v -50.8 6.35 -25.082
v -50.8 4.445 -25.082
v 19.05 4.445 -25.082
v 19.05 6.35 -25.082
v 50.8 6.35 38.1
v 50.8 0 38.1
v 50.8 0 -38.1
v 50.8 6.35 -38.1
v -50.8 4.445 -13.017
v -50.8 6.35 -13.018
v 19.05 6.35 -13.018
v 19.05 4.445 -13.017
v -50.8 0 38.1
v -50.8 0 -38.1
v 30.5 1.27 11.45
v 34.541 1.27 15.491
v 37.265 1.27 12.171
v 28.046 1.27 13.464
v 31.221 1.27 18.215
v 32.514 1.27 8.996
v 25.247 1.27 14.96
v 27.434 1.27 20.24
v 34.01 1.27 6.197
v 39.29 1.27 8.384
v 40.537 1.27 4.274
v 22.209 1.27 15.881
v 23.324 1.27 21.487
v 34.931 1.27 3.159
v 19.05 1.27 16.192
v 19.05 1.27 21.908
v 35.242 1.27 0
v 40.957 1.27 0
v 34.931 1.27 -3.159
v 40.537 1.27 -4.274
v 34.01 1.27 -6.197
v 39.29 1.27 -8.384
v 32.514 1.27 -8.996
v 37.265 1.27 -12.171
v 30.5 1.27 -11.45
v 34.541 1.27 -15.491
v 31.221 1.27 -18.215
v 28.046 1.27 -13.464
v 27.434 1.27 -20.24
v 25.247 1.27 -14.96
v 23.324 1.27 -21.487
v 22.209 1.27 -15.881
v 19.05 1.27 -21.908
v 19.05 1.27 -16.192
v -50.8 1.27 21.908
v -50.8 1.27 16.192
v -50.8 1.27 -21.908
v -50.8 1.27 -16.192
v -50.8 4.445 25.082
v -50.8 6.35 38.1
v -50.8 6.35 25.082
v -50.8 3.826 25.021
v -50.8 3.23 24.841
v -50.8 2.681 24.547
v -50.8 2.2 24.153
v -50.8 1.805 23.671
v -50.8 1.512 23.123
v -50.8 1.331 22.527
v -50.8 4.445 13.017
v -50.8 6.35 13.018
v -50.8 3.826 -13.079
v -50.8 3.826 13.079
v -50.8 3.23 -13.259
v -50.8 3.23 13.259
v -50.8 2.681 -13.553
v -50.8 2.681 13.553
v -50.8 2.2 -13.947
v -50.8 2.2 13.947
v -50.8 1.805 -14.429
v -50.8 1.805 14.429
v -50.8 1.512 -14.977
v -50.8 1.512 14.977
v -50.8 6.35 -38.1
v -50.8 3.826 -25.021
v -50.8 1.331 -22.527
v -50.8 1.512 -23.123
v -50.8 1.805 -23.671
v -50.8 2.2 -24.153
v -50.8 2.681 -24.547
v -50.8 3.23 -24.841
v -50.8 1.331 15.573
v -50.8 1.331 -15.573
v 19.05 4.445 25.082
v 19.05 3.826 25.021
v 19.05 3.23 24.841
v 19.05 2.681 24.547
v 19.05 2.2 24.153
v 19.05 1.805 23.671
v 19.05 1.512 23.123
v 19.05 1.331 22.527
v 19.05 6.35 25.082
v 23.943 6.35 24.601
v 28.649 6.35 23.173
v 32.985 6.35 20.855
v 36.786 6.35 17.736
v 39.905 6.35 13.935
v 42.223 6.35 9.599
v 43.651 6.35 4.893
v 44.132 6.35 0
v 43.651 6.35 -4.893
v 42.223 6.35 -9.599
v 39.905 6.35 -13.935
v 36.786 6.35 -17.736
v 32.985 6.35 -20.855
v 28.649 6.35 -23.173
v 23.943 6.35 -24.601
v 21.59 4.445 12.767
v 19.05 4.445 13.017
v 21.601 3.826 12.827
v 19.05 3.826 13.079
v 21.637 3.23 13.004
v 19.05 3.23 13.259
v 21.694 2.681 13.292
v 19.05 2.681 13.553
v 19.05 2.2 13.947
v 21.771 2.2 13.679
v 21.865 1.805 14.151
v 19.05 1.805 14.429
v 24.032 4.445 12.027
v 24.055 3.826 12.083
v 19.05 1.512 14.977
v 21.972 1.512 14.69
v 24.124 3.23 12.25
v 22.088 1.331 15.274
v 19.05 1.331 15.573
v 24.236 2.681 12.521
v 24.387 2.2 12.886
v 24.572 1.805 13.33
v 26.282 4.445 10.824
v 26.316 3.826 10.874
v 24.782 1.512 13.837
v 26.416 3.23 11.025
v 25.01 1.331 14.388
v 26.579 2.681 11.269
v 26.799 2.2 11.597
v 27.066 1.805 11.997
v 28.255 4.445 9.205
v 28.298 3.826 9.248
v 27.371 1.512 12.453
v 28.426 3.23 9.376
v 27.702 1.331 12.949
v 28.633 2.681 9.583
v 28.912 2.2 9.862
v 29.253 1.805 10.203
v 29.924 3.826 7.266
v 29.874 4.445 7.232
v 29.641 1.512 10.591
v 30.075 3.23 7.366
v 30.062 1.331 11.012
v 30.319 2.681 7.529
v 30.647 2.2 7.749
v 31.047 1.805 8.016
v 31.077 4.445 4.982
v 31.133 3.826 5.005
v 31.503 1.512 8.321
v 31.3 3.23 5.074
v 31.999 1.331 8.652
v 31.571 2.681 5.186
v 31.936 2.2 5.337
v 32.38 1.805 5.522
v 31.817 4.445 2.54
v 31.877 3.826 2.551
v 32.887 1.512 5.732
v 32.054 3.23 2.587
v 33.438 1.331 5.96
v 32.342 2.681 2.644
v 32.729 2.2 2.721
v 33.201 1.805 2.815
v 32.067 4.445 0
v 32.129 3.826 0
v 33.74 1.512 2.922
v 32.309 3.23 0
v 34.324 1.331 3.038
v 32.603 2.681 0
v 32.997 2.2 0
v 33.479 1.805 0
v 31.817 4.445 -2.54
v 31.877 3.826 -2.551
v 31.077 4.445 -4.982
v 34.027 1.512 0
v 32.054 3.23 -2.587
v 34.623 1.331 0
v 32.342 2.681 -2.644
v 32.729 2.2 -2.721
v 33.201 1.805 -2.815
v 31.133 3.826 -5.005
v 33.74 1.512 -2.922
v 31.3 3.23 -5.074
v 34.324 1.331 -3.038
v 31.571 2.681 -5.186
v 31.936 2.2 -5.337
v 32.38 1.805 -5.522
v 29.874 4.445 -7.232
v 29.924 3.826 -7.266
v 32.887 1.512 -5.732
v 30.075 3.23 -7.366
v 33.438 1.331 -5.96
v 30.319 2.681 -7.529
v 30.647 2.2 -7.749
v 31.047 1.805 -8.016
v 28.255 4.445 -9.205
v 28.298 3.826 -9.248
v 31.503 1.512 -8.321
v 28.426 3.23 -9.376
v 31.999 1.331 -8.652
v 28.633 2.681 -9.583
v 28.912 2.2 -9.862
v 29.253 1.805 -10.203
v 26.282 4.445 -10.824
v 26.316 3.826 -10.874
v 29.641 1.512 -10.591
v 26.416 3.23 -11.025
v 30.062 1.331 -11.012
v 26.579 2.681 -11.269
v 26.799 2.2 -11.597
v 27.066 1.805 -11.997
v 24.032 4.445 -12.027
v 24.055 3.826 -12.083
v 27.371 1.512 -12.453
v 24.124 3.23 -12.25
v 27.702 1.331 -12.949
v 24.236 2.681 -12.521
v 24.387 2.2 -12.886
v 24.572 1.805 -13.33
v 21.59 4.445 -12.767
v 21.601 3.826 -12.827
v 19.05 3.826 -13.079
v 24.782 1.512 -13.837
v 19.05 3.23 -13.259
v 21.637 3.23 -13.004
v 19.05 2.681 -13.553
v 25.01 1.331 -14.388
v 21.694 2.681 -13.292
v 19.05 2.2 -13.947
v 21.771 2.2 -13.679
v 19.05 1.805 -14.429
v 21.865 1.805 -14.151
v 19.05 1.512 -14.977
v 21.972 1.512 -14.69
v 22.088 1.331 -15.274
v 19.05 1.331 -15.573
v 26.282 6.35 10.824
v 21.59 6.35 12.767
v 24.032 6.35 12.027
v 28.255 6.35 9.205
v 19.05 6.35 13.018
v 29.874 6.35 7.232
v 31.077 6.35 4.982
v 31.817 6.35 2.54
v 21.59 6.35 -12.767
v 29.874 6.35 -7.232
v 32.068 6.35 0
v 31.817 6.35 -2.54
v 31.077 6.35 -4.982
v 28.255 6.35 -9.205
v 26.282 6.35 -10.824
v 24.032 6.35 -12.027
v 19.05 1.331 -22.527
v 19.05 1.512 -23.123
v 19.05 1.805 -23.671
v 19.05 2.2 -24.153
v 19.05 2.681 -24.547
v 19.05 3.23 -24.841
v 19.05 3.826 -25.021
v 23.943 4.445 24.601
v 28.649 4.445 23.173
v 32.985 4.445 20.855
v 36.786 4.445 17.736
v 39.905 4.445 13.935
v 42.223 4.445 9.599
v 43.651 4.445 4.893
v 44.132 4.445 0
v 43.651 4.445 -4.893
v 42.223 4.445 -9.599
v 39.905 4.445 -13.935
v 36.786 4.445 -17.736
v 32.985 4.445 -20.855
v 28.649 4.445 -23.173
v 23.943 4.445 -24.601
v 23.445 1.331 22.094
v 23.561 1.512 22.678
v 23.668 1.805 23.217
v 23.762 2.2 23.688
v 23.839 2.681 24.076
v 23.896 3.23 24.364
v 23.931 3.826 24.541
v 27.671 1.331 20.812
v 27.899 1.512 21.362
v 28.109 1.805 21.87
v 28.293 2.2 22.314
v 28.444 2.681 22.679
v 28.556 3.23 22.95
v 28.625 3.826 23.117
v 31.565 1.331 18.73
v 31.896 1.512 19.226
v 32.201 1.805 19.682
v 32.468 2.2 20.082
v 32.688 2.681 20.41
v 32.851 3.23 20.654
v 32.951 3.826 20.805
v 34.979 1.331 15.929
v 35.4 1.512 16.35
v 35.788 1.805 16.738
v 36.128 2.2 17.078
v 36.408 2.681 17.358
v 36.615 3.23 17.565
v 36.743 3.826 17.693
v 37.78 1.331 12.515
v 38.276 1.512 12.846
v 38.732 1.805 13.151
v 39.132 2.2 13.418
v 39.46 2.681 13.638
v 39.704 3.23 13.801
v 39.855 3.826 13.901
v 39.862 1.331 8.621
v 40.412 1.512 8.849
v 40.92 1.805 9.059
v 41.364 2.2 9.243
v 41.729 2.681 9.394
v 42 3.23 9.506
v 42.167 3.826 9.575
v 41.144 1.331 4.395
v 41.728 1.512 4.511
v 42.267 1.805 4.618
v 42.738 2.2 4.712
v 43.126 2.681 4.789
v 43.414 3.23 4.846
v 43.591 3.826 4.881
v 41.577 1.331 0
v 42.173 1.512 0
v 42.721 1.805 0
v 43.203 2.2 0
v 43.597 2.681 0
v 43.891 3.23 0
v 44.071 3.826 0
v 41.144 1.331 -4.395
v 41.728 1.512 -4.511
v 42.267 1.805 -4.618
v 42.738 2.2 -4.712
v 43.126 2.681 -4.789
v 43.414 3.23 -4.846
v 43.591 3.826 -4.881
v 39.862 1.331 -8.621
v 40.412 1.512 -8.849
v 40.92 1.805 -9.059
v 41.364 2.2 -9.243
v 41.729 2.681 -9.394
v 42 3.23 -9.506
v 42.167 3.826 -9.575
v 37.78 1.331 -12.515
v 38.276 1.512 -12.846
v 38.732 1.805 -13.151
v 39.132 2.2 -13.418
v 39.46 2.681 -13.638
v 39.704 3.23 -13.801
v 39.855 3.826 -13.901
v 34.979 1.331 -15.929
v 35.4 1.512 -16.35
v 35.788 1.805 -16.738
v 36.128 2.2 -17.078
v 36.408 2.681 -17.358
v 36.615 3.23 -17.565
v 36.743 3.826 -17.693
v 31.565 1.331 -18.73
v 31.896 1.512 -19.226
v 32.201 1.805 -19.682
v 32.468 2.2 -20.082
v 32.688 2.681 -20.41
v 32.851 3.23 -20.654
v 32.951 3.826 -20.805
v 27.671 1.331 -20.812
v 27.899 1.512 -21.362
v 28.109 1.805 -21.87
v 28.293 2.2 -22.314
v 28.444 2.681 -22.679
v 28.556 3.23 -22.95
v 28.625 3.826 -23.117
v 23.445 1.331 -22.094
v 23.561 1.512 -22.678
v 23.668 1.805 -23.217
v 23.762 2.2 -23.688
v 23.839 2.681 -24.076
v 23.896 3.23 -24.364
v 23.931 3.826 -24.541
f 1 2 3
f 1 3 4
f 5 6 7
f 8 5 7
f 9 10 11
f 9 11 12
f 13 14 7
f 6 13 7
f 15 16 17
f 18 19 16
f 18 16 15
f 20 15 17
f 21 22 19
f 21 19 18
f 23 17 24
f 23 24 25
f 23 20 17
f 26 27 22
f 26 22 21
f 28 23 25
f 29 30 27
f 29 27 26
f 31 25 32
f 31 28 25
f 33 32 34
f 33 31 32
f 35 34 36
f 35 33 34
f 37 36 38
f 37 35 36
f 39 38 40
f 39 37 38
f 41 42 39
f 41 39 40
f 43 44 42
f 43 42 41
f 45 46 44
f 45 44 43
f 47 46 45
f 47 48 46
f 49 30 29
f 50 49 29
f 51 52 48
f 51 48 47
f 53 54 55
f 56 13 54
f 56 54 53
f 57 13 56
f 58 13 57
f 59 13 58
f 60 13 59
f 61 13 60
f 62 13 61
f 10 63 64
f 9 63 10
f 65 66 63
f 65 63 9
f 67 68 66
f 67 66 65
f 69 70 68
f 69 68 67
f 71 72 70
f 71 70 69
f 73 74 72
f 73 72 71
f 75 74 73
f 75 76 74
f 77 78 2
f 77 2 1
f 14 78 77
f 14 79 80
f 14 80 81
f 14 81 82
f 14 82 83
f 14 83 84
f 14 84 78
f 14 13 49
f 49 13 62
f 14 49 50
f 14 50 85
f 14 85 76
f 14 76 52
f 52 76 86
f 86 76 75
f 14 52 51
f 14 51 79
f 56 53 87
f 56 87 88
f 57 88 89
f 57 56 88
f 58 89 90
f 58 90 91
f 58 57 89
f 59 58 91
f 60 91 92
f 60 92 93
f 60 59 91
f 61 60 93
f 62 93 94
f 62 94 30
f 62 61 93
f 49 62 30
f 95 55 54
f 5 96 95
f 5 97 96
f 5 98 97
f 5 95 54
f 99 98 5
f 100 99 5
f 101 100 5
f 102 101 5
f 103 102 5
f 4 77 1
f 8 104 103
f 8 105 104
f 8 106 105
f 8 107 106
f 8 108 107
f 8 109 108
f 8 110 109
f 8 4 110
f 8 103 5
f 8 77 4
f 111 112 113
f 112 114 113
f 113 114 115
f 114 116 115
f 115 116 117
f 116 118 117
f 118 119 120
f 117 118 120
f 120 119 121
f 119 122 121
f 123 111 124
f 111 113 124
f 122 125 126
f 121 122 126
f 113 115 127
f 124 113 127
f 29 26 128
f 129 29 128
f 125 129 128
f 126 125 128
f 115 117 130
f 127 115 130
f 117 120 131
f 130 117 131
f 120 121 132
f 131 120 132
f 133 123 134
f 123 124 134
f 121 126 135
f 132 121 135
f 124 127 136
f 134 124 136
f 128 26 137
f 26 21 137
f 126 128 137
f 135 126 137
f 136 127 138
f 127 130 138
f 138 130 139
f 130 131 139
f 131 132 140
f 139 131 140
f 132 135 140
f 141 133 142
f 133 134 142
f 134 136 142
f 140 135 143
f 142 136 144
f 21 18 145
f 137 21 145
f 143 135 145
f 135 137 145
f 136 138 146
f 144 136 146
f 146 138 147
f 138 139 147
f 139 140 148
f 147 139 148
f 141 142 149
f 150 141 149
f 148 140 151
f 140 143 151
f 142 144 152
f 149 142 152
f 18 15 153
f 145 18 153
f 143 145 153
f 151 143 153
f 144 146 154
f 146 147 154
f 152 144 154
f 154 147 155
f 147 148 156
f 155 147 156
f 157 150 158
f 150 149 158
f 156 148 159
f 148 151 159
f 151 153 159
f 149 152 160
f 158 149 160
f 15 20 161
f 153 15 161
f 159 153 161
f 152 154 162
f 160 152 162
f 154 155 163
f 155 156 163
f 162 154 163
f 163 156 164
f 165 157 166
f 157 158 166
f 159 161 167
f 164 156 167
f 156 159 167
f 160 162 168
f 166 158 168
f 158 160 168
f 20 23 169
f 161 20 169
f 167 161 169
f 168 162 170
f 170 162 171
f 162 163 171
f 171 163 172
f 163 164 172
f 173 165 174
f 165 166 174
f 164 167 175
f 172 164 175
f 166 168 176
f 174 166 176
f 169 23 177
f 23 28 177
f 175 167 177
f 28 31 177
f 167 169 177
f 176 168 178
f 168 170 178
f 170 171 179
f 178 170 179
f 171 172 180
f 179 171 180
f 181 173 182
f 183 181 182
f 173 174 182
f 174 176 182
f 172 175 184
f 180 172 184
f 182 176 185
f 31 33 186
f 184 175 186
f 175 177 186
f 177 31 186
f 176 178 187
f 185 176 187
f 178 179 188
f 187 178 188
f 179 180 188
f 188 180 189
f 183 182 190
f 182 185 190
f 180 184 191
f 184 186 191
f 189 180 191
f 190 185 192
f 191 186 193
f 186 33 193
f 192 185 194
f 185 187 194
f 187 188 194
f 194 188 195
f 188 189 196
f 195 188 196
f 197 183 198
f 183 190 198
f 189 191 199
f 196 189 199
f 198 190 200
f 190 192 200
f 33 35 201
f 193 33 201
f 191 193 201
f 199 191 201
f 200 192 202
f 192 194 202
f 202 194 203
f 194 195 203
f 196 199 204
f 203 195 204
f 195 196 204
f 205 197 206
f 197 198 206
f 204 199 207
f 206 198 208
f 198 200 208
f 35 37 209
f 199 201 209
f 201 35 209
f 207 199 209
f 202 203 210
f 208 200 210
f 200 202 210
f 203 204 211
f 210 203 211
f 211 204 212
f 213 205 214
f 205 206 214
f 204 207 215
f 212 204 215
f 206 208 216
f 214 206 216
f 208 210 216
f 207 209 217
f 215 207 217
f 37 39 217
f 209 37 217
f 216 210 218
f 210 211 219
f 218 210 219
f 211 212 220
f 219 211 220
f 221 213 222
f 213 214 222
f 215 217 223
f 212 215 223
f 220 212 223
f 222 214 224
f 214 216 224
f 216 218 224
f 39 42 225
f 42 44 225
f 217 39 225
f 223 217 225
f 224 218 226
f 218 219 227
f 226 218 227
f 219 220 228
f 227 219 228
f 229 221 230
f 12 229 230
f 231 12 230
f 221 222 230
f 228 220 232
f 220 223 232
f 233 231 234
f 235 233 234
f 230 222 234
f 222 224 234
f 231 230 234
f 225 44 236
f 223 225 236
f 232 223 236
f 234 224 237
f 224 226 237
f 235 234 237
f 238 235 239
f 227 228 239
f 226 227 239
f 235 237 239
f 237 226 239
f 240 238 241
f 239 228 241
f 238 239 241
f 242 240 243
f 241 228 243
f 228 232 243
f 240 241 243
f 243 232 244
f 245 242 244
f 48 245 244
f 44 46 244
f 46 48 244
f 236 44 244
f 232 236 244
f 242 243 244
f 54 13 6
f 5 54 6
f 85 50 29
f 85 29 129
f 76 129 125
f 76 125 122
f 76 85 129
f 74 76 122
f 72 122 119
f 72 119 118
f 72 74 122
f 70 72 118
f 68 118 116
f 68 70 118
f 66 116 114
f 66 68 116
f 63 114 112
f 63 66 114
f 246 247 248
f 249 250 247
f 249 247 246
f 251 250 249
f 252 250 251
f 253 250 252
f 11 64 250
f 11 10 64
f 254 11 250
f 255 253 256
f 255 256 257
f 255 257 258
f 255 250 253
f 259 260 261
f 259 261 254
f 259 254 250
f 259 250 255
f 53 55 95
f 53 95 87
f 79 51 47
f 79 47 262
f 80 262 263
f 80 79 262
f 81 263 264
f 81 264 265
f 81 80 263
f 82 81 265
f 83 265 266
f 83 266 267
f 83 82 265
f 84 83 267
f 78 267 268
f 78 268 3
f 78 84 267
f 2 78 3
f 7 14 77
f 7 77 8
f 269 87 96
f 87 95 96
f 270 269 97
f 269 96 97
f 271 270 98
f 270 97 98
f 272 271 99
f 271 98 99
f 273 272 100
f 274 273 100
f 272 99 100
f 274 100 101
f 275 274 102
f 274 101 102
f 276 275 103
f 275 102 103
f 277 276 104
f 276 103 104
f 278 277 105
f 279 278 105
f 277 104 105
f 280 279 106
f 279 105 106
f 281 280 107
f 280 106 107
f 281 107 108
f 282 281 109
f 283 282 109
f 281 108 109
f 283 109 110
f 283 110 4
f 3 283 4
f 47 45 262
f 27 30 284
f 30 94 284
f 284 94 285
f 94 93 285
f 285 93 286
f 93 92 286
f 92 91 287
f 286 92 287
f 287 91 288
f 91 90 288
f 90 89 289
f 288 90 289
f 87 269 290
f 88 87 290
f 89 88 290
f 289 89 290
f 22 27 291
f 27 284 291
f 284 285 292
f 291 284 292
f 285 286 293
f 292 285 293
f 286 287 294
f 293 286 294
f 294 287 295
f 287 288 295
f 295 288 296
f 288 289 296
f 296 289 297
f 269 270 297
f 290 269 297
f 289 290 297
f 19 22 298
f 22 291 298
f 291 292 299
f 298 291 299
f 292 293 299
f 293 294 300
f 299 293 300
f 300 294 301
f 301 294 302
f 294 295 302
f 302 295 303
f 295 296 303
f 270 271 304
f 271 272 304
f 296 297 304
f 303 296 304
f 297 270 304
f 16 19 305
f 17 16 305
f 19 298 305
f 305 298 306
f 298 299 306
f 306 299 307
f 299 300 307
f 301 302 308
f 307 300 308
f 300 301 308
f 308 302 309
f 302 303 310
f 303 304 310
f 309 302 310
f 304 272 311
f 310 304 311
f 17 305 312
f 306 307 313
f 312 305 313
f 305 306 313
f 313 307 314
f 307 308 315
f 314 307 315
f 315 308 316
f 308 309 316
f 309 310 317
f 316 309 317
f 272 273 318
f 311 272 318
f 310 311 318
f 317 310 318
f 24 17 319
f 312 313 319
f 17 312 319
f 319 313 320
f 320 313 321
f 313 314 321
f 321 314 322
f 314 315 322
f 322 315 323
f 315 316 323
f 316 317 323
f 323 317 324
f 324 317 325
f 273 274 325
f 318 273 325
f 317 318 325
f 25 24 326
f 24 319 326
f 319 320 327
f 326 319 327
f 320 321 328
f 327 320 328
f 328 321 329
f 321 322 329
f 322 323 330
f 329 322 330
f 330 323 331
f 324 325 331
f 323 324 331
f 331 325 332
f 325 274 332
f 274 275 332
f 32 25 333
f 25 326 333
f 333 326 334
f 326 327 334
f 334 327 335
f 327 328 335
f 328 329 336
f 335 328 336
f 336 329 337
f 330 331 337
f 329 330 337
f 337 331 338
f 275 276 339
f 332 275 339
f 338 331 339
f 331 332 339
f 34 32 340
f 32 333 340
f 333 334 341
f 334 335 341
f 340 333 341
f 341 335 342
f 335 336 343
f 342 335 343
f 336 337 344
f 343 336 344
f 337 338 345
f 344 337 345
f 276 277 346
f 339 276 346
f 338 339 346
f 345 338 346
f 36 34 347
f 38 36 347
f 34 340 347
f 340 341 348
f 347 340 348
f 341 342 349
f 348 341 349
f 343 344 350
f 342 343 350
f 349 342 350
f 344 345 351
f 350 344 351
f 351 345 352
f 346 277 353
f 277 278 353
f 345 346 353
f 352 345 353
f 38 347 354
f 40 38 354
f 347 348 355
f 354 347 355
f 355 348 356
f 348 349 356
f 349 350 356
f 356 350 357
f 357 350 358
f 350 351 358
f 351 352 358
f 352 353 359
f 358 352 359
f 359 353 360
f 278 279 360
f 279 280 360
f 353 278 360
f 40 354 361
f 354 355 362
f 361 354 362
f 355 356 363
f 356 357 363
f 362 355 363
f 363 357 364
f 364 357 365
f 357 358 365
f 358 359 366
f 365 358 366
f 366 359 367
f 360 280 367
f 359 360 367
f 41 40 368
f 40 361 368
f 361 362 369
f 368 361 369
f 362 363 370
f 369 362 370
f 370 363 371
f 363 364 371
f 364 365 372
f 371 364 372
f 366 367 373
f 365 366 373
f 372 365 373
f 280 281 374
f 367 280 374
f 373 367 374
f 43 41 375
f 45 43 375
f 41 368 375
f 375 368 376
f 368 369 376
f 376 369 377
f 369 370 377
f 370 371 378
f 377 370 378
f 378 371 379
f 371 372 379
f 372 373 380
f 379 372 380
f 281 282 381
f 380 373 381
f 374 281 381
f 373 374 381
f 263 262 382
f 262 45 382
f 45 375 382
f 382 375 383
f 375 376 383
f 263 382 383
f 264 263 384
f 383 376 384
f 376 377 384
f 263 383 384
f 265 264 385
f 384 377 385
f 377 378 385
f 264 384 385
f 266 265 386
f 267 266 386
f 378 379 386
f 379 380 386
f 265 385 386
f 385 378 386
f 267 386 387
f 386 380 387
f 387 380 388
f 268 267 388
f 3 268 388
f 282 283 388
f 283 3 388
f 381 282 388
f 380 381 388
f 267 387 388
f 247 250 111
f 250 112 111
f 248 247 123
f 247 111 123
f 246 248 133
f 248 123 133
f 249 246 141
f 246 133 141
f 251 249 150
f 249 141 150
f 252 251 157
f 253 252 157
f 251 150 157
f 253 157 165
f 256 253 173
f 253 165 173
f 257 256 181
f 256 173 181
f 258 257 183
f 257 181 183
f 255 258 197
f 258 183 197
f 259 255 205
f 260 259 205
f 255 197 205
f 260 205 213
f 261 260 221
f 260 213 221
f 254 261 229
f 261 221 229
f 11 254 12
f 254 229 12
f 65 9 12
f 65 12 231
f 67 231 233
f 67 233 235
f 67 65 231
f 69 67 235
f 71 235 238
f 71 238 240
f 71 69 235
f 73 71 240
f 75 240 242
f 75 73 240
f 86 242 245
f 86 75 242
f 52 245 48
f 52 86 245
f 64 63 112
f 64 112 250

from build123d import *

# Parameters (mm, degrees)
SKETCH1_W            = 101.6
SKETCH1_H            = 76.2
BASE_PLATE_DEPTH     = 6.35
PIPE_START           = -50.8
PIPE_PROFILE_DEPTH   = 69.85
PIPE_PROFILE_2_ANGLE = 180


with BuildPart() as part:
    # Sketch1 → Base Plate (new body)
    with BuildSketch(Plane(origin=(0, 0, 0), x_dir=(1, 0, 0), z_dir=(0, 1, 0))):
        Rectangle(SKETCH1_W, SKETCH1_H)
    extrude(amount=BASE_PLATE_DEPTH)

    # Pipe Profile: read off the stored shape, not the designer's step
    # Pipe Profile outline → Pipe Profile (cut)
    with BuildSketch(Plane.YZ.offset(PIPE_START)):
        with BuildLine():
            Line((6.35, 25.0825), (4.445, 25.0825))
            ThreePointArc((4.445, 25.0825), (2.19993597, 24.15256403), (1.27, 21.9075))
            Line((1.27, 21.9075), (1.27, 16.1925))
            ThreePointArc((1.27, 16.1925), (2.19993597, 13.94743597), (4.445, 13.0175))
            Line((4.445, 13.0175), (6.35, 13.0175))
            Line((6.35, 13.0175), (6.35, 25.0825))
        make_face()
        with BuildLine():
            Line((6.35, -25.0825), (6.35, -13.0175))
            Line((6.35, -13.0175), (4.445, -13.0175))
            ThreePointArc((4.445, -13.0175), (2.19993597, -13.94743597), (1.27, -16.1925))
            Line((1.27, -16.1925), (1.27, -21.9075))
            ThreePointArc((1.27, -21.9075), (2.19993597, -24.15256403), (4.445, -25.0825))
            Line((4.445, -25.0825), (6.35, -25.0825))
        make_face()
    extrude(amount=PIPE_PROFILE_DEPTH, mode=Mode.SUBTRACT)

    # Pipe Profile 2 outline → Pipe Profile 2 (revolve, cut)
    with BuildSketch(Plane.ZY.offset(-19.05)):
        with BuildLine():
            ThreePointArc((13.0175, 4.445), (13.94743597, 2.19993597), (16.1925, 1.27))
            Line((16.1925, 1.27), (21.9075, 1.27))
            ThreePointArc((21.9075, 1.27), (24.15256403, 2.19993597), (25.0825, 4.445))
            Line((25.0825, 4.445), (25.0825, 6.35))
            Line((25.0825, 6.35), (13.0175, 6.35))
            Line((13.0175, 6.35), (13.0175, 4.445))
        make_face()
    revolve(axis=Axis((19.05, 0, 0), (0, 1, 0)), revolution_arc=PIPE_PROFILE_2_ANGLE, mode=Mode.SUBTRACT)


solid = part.part
